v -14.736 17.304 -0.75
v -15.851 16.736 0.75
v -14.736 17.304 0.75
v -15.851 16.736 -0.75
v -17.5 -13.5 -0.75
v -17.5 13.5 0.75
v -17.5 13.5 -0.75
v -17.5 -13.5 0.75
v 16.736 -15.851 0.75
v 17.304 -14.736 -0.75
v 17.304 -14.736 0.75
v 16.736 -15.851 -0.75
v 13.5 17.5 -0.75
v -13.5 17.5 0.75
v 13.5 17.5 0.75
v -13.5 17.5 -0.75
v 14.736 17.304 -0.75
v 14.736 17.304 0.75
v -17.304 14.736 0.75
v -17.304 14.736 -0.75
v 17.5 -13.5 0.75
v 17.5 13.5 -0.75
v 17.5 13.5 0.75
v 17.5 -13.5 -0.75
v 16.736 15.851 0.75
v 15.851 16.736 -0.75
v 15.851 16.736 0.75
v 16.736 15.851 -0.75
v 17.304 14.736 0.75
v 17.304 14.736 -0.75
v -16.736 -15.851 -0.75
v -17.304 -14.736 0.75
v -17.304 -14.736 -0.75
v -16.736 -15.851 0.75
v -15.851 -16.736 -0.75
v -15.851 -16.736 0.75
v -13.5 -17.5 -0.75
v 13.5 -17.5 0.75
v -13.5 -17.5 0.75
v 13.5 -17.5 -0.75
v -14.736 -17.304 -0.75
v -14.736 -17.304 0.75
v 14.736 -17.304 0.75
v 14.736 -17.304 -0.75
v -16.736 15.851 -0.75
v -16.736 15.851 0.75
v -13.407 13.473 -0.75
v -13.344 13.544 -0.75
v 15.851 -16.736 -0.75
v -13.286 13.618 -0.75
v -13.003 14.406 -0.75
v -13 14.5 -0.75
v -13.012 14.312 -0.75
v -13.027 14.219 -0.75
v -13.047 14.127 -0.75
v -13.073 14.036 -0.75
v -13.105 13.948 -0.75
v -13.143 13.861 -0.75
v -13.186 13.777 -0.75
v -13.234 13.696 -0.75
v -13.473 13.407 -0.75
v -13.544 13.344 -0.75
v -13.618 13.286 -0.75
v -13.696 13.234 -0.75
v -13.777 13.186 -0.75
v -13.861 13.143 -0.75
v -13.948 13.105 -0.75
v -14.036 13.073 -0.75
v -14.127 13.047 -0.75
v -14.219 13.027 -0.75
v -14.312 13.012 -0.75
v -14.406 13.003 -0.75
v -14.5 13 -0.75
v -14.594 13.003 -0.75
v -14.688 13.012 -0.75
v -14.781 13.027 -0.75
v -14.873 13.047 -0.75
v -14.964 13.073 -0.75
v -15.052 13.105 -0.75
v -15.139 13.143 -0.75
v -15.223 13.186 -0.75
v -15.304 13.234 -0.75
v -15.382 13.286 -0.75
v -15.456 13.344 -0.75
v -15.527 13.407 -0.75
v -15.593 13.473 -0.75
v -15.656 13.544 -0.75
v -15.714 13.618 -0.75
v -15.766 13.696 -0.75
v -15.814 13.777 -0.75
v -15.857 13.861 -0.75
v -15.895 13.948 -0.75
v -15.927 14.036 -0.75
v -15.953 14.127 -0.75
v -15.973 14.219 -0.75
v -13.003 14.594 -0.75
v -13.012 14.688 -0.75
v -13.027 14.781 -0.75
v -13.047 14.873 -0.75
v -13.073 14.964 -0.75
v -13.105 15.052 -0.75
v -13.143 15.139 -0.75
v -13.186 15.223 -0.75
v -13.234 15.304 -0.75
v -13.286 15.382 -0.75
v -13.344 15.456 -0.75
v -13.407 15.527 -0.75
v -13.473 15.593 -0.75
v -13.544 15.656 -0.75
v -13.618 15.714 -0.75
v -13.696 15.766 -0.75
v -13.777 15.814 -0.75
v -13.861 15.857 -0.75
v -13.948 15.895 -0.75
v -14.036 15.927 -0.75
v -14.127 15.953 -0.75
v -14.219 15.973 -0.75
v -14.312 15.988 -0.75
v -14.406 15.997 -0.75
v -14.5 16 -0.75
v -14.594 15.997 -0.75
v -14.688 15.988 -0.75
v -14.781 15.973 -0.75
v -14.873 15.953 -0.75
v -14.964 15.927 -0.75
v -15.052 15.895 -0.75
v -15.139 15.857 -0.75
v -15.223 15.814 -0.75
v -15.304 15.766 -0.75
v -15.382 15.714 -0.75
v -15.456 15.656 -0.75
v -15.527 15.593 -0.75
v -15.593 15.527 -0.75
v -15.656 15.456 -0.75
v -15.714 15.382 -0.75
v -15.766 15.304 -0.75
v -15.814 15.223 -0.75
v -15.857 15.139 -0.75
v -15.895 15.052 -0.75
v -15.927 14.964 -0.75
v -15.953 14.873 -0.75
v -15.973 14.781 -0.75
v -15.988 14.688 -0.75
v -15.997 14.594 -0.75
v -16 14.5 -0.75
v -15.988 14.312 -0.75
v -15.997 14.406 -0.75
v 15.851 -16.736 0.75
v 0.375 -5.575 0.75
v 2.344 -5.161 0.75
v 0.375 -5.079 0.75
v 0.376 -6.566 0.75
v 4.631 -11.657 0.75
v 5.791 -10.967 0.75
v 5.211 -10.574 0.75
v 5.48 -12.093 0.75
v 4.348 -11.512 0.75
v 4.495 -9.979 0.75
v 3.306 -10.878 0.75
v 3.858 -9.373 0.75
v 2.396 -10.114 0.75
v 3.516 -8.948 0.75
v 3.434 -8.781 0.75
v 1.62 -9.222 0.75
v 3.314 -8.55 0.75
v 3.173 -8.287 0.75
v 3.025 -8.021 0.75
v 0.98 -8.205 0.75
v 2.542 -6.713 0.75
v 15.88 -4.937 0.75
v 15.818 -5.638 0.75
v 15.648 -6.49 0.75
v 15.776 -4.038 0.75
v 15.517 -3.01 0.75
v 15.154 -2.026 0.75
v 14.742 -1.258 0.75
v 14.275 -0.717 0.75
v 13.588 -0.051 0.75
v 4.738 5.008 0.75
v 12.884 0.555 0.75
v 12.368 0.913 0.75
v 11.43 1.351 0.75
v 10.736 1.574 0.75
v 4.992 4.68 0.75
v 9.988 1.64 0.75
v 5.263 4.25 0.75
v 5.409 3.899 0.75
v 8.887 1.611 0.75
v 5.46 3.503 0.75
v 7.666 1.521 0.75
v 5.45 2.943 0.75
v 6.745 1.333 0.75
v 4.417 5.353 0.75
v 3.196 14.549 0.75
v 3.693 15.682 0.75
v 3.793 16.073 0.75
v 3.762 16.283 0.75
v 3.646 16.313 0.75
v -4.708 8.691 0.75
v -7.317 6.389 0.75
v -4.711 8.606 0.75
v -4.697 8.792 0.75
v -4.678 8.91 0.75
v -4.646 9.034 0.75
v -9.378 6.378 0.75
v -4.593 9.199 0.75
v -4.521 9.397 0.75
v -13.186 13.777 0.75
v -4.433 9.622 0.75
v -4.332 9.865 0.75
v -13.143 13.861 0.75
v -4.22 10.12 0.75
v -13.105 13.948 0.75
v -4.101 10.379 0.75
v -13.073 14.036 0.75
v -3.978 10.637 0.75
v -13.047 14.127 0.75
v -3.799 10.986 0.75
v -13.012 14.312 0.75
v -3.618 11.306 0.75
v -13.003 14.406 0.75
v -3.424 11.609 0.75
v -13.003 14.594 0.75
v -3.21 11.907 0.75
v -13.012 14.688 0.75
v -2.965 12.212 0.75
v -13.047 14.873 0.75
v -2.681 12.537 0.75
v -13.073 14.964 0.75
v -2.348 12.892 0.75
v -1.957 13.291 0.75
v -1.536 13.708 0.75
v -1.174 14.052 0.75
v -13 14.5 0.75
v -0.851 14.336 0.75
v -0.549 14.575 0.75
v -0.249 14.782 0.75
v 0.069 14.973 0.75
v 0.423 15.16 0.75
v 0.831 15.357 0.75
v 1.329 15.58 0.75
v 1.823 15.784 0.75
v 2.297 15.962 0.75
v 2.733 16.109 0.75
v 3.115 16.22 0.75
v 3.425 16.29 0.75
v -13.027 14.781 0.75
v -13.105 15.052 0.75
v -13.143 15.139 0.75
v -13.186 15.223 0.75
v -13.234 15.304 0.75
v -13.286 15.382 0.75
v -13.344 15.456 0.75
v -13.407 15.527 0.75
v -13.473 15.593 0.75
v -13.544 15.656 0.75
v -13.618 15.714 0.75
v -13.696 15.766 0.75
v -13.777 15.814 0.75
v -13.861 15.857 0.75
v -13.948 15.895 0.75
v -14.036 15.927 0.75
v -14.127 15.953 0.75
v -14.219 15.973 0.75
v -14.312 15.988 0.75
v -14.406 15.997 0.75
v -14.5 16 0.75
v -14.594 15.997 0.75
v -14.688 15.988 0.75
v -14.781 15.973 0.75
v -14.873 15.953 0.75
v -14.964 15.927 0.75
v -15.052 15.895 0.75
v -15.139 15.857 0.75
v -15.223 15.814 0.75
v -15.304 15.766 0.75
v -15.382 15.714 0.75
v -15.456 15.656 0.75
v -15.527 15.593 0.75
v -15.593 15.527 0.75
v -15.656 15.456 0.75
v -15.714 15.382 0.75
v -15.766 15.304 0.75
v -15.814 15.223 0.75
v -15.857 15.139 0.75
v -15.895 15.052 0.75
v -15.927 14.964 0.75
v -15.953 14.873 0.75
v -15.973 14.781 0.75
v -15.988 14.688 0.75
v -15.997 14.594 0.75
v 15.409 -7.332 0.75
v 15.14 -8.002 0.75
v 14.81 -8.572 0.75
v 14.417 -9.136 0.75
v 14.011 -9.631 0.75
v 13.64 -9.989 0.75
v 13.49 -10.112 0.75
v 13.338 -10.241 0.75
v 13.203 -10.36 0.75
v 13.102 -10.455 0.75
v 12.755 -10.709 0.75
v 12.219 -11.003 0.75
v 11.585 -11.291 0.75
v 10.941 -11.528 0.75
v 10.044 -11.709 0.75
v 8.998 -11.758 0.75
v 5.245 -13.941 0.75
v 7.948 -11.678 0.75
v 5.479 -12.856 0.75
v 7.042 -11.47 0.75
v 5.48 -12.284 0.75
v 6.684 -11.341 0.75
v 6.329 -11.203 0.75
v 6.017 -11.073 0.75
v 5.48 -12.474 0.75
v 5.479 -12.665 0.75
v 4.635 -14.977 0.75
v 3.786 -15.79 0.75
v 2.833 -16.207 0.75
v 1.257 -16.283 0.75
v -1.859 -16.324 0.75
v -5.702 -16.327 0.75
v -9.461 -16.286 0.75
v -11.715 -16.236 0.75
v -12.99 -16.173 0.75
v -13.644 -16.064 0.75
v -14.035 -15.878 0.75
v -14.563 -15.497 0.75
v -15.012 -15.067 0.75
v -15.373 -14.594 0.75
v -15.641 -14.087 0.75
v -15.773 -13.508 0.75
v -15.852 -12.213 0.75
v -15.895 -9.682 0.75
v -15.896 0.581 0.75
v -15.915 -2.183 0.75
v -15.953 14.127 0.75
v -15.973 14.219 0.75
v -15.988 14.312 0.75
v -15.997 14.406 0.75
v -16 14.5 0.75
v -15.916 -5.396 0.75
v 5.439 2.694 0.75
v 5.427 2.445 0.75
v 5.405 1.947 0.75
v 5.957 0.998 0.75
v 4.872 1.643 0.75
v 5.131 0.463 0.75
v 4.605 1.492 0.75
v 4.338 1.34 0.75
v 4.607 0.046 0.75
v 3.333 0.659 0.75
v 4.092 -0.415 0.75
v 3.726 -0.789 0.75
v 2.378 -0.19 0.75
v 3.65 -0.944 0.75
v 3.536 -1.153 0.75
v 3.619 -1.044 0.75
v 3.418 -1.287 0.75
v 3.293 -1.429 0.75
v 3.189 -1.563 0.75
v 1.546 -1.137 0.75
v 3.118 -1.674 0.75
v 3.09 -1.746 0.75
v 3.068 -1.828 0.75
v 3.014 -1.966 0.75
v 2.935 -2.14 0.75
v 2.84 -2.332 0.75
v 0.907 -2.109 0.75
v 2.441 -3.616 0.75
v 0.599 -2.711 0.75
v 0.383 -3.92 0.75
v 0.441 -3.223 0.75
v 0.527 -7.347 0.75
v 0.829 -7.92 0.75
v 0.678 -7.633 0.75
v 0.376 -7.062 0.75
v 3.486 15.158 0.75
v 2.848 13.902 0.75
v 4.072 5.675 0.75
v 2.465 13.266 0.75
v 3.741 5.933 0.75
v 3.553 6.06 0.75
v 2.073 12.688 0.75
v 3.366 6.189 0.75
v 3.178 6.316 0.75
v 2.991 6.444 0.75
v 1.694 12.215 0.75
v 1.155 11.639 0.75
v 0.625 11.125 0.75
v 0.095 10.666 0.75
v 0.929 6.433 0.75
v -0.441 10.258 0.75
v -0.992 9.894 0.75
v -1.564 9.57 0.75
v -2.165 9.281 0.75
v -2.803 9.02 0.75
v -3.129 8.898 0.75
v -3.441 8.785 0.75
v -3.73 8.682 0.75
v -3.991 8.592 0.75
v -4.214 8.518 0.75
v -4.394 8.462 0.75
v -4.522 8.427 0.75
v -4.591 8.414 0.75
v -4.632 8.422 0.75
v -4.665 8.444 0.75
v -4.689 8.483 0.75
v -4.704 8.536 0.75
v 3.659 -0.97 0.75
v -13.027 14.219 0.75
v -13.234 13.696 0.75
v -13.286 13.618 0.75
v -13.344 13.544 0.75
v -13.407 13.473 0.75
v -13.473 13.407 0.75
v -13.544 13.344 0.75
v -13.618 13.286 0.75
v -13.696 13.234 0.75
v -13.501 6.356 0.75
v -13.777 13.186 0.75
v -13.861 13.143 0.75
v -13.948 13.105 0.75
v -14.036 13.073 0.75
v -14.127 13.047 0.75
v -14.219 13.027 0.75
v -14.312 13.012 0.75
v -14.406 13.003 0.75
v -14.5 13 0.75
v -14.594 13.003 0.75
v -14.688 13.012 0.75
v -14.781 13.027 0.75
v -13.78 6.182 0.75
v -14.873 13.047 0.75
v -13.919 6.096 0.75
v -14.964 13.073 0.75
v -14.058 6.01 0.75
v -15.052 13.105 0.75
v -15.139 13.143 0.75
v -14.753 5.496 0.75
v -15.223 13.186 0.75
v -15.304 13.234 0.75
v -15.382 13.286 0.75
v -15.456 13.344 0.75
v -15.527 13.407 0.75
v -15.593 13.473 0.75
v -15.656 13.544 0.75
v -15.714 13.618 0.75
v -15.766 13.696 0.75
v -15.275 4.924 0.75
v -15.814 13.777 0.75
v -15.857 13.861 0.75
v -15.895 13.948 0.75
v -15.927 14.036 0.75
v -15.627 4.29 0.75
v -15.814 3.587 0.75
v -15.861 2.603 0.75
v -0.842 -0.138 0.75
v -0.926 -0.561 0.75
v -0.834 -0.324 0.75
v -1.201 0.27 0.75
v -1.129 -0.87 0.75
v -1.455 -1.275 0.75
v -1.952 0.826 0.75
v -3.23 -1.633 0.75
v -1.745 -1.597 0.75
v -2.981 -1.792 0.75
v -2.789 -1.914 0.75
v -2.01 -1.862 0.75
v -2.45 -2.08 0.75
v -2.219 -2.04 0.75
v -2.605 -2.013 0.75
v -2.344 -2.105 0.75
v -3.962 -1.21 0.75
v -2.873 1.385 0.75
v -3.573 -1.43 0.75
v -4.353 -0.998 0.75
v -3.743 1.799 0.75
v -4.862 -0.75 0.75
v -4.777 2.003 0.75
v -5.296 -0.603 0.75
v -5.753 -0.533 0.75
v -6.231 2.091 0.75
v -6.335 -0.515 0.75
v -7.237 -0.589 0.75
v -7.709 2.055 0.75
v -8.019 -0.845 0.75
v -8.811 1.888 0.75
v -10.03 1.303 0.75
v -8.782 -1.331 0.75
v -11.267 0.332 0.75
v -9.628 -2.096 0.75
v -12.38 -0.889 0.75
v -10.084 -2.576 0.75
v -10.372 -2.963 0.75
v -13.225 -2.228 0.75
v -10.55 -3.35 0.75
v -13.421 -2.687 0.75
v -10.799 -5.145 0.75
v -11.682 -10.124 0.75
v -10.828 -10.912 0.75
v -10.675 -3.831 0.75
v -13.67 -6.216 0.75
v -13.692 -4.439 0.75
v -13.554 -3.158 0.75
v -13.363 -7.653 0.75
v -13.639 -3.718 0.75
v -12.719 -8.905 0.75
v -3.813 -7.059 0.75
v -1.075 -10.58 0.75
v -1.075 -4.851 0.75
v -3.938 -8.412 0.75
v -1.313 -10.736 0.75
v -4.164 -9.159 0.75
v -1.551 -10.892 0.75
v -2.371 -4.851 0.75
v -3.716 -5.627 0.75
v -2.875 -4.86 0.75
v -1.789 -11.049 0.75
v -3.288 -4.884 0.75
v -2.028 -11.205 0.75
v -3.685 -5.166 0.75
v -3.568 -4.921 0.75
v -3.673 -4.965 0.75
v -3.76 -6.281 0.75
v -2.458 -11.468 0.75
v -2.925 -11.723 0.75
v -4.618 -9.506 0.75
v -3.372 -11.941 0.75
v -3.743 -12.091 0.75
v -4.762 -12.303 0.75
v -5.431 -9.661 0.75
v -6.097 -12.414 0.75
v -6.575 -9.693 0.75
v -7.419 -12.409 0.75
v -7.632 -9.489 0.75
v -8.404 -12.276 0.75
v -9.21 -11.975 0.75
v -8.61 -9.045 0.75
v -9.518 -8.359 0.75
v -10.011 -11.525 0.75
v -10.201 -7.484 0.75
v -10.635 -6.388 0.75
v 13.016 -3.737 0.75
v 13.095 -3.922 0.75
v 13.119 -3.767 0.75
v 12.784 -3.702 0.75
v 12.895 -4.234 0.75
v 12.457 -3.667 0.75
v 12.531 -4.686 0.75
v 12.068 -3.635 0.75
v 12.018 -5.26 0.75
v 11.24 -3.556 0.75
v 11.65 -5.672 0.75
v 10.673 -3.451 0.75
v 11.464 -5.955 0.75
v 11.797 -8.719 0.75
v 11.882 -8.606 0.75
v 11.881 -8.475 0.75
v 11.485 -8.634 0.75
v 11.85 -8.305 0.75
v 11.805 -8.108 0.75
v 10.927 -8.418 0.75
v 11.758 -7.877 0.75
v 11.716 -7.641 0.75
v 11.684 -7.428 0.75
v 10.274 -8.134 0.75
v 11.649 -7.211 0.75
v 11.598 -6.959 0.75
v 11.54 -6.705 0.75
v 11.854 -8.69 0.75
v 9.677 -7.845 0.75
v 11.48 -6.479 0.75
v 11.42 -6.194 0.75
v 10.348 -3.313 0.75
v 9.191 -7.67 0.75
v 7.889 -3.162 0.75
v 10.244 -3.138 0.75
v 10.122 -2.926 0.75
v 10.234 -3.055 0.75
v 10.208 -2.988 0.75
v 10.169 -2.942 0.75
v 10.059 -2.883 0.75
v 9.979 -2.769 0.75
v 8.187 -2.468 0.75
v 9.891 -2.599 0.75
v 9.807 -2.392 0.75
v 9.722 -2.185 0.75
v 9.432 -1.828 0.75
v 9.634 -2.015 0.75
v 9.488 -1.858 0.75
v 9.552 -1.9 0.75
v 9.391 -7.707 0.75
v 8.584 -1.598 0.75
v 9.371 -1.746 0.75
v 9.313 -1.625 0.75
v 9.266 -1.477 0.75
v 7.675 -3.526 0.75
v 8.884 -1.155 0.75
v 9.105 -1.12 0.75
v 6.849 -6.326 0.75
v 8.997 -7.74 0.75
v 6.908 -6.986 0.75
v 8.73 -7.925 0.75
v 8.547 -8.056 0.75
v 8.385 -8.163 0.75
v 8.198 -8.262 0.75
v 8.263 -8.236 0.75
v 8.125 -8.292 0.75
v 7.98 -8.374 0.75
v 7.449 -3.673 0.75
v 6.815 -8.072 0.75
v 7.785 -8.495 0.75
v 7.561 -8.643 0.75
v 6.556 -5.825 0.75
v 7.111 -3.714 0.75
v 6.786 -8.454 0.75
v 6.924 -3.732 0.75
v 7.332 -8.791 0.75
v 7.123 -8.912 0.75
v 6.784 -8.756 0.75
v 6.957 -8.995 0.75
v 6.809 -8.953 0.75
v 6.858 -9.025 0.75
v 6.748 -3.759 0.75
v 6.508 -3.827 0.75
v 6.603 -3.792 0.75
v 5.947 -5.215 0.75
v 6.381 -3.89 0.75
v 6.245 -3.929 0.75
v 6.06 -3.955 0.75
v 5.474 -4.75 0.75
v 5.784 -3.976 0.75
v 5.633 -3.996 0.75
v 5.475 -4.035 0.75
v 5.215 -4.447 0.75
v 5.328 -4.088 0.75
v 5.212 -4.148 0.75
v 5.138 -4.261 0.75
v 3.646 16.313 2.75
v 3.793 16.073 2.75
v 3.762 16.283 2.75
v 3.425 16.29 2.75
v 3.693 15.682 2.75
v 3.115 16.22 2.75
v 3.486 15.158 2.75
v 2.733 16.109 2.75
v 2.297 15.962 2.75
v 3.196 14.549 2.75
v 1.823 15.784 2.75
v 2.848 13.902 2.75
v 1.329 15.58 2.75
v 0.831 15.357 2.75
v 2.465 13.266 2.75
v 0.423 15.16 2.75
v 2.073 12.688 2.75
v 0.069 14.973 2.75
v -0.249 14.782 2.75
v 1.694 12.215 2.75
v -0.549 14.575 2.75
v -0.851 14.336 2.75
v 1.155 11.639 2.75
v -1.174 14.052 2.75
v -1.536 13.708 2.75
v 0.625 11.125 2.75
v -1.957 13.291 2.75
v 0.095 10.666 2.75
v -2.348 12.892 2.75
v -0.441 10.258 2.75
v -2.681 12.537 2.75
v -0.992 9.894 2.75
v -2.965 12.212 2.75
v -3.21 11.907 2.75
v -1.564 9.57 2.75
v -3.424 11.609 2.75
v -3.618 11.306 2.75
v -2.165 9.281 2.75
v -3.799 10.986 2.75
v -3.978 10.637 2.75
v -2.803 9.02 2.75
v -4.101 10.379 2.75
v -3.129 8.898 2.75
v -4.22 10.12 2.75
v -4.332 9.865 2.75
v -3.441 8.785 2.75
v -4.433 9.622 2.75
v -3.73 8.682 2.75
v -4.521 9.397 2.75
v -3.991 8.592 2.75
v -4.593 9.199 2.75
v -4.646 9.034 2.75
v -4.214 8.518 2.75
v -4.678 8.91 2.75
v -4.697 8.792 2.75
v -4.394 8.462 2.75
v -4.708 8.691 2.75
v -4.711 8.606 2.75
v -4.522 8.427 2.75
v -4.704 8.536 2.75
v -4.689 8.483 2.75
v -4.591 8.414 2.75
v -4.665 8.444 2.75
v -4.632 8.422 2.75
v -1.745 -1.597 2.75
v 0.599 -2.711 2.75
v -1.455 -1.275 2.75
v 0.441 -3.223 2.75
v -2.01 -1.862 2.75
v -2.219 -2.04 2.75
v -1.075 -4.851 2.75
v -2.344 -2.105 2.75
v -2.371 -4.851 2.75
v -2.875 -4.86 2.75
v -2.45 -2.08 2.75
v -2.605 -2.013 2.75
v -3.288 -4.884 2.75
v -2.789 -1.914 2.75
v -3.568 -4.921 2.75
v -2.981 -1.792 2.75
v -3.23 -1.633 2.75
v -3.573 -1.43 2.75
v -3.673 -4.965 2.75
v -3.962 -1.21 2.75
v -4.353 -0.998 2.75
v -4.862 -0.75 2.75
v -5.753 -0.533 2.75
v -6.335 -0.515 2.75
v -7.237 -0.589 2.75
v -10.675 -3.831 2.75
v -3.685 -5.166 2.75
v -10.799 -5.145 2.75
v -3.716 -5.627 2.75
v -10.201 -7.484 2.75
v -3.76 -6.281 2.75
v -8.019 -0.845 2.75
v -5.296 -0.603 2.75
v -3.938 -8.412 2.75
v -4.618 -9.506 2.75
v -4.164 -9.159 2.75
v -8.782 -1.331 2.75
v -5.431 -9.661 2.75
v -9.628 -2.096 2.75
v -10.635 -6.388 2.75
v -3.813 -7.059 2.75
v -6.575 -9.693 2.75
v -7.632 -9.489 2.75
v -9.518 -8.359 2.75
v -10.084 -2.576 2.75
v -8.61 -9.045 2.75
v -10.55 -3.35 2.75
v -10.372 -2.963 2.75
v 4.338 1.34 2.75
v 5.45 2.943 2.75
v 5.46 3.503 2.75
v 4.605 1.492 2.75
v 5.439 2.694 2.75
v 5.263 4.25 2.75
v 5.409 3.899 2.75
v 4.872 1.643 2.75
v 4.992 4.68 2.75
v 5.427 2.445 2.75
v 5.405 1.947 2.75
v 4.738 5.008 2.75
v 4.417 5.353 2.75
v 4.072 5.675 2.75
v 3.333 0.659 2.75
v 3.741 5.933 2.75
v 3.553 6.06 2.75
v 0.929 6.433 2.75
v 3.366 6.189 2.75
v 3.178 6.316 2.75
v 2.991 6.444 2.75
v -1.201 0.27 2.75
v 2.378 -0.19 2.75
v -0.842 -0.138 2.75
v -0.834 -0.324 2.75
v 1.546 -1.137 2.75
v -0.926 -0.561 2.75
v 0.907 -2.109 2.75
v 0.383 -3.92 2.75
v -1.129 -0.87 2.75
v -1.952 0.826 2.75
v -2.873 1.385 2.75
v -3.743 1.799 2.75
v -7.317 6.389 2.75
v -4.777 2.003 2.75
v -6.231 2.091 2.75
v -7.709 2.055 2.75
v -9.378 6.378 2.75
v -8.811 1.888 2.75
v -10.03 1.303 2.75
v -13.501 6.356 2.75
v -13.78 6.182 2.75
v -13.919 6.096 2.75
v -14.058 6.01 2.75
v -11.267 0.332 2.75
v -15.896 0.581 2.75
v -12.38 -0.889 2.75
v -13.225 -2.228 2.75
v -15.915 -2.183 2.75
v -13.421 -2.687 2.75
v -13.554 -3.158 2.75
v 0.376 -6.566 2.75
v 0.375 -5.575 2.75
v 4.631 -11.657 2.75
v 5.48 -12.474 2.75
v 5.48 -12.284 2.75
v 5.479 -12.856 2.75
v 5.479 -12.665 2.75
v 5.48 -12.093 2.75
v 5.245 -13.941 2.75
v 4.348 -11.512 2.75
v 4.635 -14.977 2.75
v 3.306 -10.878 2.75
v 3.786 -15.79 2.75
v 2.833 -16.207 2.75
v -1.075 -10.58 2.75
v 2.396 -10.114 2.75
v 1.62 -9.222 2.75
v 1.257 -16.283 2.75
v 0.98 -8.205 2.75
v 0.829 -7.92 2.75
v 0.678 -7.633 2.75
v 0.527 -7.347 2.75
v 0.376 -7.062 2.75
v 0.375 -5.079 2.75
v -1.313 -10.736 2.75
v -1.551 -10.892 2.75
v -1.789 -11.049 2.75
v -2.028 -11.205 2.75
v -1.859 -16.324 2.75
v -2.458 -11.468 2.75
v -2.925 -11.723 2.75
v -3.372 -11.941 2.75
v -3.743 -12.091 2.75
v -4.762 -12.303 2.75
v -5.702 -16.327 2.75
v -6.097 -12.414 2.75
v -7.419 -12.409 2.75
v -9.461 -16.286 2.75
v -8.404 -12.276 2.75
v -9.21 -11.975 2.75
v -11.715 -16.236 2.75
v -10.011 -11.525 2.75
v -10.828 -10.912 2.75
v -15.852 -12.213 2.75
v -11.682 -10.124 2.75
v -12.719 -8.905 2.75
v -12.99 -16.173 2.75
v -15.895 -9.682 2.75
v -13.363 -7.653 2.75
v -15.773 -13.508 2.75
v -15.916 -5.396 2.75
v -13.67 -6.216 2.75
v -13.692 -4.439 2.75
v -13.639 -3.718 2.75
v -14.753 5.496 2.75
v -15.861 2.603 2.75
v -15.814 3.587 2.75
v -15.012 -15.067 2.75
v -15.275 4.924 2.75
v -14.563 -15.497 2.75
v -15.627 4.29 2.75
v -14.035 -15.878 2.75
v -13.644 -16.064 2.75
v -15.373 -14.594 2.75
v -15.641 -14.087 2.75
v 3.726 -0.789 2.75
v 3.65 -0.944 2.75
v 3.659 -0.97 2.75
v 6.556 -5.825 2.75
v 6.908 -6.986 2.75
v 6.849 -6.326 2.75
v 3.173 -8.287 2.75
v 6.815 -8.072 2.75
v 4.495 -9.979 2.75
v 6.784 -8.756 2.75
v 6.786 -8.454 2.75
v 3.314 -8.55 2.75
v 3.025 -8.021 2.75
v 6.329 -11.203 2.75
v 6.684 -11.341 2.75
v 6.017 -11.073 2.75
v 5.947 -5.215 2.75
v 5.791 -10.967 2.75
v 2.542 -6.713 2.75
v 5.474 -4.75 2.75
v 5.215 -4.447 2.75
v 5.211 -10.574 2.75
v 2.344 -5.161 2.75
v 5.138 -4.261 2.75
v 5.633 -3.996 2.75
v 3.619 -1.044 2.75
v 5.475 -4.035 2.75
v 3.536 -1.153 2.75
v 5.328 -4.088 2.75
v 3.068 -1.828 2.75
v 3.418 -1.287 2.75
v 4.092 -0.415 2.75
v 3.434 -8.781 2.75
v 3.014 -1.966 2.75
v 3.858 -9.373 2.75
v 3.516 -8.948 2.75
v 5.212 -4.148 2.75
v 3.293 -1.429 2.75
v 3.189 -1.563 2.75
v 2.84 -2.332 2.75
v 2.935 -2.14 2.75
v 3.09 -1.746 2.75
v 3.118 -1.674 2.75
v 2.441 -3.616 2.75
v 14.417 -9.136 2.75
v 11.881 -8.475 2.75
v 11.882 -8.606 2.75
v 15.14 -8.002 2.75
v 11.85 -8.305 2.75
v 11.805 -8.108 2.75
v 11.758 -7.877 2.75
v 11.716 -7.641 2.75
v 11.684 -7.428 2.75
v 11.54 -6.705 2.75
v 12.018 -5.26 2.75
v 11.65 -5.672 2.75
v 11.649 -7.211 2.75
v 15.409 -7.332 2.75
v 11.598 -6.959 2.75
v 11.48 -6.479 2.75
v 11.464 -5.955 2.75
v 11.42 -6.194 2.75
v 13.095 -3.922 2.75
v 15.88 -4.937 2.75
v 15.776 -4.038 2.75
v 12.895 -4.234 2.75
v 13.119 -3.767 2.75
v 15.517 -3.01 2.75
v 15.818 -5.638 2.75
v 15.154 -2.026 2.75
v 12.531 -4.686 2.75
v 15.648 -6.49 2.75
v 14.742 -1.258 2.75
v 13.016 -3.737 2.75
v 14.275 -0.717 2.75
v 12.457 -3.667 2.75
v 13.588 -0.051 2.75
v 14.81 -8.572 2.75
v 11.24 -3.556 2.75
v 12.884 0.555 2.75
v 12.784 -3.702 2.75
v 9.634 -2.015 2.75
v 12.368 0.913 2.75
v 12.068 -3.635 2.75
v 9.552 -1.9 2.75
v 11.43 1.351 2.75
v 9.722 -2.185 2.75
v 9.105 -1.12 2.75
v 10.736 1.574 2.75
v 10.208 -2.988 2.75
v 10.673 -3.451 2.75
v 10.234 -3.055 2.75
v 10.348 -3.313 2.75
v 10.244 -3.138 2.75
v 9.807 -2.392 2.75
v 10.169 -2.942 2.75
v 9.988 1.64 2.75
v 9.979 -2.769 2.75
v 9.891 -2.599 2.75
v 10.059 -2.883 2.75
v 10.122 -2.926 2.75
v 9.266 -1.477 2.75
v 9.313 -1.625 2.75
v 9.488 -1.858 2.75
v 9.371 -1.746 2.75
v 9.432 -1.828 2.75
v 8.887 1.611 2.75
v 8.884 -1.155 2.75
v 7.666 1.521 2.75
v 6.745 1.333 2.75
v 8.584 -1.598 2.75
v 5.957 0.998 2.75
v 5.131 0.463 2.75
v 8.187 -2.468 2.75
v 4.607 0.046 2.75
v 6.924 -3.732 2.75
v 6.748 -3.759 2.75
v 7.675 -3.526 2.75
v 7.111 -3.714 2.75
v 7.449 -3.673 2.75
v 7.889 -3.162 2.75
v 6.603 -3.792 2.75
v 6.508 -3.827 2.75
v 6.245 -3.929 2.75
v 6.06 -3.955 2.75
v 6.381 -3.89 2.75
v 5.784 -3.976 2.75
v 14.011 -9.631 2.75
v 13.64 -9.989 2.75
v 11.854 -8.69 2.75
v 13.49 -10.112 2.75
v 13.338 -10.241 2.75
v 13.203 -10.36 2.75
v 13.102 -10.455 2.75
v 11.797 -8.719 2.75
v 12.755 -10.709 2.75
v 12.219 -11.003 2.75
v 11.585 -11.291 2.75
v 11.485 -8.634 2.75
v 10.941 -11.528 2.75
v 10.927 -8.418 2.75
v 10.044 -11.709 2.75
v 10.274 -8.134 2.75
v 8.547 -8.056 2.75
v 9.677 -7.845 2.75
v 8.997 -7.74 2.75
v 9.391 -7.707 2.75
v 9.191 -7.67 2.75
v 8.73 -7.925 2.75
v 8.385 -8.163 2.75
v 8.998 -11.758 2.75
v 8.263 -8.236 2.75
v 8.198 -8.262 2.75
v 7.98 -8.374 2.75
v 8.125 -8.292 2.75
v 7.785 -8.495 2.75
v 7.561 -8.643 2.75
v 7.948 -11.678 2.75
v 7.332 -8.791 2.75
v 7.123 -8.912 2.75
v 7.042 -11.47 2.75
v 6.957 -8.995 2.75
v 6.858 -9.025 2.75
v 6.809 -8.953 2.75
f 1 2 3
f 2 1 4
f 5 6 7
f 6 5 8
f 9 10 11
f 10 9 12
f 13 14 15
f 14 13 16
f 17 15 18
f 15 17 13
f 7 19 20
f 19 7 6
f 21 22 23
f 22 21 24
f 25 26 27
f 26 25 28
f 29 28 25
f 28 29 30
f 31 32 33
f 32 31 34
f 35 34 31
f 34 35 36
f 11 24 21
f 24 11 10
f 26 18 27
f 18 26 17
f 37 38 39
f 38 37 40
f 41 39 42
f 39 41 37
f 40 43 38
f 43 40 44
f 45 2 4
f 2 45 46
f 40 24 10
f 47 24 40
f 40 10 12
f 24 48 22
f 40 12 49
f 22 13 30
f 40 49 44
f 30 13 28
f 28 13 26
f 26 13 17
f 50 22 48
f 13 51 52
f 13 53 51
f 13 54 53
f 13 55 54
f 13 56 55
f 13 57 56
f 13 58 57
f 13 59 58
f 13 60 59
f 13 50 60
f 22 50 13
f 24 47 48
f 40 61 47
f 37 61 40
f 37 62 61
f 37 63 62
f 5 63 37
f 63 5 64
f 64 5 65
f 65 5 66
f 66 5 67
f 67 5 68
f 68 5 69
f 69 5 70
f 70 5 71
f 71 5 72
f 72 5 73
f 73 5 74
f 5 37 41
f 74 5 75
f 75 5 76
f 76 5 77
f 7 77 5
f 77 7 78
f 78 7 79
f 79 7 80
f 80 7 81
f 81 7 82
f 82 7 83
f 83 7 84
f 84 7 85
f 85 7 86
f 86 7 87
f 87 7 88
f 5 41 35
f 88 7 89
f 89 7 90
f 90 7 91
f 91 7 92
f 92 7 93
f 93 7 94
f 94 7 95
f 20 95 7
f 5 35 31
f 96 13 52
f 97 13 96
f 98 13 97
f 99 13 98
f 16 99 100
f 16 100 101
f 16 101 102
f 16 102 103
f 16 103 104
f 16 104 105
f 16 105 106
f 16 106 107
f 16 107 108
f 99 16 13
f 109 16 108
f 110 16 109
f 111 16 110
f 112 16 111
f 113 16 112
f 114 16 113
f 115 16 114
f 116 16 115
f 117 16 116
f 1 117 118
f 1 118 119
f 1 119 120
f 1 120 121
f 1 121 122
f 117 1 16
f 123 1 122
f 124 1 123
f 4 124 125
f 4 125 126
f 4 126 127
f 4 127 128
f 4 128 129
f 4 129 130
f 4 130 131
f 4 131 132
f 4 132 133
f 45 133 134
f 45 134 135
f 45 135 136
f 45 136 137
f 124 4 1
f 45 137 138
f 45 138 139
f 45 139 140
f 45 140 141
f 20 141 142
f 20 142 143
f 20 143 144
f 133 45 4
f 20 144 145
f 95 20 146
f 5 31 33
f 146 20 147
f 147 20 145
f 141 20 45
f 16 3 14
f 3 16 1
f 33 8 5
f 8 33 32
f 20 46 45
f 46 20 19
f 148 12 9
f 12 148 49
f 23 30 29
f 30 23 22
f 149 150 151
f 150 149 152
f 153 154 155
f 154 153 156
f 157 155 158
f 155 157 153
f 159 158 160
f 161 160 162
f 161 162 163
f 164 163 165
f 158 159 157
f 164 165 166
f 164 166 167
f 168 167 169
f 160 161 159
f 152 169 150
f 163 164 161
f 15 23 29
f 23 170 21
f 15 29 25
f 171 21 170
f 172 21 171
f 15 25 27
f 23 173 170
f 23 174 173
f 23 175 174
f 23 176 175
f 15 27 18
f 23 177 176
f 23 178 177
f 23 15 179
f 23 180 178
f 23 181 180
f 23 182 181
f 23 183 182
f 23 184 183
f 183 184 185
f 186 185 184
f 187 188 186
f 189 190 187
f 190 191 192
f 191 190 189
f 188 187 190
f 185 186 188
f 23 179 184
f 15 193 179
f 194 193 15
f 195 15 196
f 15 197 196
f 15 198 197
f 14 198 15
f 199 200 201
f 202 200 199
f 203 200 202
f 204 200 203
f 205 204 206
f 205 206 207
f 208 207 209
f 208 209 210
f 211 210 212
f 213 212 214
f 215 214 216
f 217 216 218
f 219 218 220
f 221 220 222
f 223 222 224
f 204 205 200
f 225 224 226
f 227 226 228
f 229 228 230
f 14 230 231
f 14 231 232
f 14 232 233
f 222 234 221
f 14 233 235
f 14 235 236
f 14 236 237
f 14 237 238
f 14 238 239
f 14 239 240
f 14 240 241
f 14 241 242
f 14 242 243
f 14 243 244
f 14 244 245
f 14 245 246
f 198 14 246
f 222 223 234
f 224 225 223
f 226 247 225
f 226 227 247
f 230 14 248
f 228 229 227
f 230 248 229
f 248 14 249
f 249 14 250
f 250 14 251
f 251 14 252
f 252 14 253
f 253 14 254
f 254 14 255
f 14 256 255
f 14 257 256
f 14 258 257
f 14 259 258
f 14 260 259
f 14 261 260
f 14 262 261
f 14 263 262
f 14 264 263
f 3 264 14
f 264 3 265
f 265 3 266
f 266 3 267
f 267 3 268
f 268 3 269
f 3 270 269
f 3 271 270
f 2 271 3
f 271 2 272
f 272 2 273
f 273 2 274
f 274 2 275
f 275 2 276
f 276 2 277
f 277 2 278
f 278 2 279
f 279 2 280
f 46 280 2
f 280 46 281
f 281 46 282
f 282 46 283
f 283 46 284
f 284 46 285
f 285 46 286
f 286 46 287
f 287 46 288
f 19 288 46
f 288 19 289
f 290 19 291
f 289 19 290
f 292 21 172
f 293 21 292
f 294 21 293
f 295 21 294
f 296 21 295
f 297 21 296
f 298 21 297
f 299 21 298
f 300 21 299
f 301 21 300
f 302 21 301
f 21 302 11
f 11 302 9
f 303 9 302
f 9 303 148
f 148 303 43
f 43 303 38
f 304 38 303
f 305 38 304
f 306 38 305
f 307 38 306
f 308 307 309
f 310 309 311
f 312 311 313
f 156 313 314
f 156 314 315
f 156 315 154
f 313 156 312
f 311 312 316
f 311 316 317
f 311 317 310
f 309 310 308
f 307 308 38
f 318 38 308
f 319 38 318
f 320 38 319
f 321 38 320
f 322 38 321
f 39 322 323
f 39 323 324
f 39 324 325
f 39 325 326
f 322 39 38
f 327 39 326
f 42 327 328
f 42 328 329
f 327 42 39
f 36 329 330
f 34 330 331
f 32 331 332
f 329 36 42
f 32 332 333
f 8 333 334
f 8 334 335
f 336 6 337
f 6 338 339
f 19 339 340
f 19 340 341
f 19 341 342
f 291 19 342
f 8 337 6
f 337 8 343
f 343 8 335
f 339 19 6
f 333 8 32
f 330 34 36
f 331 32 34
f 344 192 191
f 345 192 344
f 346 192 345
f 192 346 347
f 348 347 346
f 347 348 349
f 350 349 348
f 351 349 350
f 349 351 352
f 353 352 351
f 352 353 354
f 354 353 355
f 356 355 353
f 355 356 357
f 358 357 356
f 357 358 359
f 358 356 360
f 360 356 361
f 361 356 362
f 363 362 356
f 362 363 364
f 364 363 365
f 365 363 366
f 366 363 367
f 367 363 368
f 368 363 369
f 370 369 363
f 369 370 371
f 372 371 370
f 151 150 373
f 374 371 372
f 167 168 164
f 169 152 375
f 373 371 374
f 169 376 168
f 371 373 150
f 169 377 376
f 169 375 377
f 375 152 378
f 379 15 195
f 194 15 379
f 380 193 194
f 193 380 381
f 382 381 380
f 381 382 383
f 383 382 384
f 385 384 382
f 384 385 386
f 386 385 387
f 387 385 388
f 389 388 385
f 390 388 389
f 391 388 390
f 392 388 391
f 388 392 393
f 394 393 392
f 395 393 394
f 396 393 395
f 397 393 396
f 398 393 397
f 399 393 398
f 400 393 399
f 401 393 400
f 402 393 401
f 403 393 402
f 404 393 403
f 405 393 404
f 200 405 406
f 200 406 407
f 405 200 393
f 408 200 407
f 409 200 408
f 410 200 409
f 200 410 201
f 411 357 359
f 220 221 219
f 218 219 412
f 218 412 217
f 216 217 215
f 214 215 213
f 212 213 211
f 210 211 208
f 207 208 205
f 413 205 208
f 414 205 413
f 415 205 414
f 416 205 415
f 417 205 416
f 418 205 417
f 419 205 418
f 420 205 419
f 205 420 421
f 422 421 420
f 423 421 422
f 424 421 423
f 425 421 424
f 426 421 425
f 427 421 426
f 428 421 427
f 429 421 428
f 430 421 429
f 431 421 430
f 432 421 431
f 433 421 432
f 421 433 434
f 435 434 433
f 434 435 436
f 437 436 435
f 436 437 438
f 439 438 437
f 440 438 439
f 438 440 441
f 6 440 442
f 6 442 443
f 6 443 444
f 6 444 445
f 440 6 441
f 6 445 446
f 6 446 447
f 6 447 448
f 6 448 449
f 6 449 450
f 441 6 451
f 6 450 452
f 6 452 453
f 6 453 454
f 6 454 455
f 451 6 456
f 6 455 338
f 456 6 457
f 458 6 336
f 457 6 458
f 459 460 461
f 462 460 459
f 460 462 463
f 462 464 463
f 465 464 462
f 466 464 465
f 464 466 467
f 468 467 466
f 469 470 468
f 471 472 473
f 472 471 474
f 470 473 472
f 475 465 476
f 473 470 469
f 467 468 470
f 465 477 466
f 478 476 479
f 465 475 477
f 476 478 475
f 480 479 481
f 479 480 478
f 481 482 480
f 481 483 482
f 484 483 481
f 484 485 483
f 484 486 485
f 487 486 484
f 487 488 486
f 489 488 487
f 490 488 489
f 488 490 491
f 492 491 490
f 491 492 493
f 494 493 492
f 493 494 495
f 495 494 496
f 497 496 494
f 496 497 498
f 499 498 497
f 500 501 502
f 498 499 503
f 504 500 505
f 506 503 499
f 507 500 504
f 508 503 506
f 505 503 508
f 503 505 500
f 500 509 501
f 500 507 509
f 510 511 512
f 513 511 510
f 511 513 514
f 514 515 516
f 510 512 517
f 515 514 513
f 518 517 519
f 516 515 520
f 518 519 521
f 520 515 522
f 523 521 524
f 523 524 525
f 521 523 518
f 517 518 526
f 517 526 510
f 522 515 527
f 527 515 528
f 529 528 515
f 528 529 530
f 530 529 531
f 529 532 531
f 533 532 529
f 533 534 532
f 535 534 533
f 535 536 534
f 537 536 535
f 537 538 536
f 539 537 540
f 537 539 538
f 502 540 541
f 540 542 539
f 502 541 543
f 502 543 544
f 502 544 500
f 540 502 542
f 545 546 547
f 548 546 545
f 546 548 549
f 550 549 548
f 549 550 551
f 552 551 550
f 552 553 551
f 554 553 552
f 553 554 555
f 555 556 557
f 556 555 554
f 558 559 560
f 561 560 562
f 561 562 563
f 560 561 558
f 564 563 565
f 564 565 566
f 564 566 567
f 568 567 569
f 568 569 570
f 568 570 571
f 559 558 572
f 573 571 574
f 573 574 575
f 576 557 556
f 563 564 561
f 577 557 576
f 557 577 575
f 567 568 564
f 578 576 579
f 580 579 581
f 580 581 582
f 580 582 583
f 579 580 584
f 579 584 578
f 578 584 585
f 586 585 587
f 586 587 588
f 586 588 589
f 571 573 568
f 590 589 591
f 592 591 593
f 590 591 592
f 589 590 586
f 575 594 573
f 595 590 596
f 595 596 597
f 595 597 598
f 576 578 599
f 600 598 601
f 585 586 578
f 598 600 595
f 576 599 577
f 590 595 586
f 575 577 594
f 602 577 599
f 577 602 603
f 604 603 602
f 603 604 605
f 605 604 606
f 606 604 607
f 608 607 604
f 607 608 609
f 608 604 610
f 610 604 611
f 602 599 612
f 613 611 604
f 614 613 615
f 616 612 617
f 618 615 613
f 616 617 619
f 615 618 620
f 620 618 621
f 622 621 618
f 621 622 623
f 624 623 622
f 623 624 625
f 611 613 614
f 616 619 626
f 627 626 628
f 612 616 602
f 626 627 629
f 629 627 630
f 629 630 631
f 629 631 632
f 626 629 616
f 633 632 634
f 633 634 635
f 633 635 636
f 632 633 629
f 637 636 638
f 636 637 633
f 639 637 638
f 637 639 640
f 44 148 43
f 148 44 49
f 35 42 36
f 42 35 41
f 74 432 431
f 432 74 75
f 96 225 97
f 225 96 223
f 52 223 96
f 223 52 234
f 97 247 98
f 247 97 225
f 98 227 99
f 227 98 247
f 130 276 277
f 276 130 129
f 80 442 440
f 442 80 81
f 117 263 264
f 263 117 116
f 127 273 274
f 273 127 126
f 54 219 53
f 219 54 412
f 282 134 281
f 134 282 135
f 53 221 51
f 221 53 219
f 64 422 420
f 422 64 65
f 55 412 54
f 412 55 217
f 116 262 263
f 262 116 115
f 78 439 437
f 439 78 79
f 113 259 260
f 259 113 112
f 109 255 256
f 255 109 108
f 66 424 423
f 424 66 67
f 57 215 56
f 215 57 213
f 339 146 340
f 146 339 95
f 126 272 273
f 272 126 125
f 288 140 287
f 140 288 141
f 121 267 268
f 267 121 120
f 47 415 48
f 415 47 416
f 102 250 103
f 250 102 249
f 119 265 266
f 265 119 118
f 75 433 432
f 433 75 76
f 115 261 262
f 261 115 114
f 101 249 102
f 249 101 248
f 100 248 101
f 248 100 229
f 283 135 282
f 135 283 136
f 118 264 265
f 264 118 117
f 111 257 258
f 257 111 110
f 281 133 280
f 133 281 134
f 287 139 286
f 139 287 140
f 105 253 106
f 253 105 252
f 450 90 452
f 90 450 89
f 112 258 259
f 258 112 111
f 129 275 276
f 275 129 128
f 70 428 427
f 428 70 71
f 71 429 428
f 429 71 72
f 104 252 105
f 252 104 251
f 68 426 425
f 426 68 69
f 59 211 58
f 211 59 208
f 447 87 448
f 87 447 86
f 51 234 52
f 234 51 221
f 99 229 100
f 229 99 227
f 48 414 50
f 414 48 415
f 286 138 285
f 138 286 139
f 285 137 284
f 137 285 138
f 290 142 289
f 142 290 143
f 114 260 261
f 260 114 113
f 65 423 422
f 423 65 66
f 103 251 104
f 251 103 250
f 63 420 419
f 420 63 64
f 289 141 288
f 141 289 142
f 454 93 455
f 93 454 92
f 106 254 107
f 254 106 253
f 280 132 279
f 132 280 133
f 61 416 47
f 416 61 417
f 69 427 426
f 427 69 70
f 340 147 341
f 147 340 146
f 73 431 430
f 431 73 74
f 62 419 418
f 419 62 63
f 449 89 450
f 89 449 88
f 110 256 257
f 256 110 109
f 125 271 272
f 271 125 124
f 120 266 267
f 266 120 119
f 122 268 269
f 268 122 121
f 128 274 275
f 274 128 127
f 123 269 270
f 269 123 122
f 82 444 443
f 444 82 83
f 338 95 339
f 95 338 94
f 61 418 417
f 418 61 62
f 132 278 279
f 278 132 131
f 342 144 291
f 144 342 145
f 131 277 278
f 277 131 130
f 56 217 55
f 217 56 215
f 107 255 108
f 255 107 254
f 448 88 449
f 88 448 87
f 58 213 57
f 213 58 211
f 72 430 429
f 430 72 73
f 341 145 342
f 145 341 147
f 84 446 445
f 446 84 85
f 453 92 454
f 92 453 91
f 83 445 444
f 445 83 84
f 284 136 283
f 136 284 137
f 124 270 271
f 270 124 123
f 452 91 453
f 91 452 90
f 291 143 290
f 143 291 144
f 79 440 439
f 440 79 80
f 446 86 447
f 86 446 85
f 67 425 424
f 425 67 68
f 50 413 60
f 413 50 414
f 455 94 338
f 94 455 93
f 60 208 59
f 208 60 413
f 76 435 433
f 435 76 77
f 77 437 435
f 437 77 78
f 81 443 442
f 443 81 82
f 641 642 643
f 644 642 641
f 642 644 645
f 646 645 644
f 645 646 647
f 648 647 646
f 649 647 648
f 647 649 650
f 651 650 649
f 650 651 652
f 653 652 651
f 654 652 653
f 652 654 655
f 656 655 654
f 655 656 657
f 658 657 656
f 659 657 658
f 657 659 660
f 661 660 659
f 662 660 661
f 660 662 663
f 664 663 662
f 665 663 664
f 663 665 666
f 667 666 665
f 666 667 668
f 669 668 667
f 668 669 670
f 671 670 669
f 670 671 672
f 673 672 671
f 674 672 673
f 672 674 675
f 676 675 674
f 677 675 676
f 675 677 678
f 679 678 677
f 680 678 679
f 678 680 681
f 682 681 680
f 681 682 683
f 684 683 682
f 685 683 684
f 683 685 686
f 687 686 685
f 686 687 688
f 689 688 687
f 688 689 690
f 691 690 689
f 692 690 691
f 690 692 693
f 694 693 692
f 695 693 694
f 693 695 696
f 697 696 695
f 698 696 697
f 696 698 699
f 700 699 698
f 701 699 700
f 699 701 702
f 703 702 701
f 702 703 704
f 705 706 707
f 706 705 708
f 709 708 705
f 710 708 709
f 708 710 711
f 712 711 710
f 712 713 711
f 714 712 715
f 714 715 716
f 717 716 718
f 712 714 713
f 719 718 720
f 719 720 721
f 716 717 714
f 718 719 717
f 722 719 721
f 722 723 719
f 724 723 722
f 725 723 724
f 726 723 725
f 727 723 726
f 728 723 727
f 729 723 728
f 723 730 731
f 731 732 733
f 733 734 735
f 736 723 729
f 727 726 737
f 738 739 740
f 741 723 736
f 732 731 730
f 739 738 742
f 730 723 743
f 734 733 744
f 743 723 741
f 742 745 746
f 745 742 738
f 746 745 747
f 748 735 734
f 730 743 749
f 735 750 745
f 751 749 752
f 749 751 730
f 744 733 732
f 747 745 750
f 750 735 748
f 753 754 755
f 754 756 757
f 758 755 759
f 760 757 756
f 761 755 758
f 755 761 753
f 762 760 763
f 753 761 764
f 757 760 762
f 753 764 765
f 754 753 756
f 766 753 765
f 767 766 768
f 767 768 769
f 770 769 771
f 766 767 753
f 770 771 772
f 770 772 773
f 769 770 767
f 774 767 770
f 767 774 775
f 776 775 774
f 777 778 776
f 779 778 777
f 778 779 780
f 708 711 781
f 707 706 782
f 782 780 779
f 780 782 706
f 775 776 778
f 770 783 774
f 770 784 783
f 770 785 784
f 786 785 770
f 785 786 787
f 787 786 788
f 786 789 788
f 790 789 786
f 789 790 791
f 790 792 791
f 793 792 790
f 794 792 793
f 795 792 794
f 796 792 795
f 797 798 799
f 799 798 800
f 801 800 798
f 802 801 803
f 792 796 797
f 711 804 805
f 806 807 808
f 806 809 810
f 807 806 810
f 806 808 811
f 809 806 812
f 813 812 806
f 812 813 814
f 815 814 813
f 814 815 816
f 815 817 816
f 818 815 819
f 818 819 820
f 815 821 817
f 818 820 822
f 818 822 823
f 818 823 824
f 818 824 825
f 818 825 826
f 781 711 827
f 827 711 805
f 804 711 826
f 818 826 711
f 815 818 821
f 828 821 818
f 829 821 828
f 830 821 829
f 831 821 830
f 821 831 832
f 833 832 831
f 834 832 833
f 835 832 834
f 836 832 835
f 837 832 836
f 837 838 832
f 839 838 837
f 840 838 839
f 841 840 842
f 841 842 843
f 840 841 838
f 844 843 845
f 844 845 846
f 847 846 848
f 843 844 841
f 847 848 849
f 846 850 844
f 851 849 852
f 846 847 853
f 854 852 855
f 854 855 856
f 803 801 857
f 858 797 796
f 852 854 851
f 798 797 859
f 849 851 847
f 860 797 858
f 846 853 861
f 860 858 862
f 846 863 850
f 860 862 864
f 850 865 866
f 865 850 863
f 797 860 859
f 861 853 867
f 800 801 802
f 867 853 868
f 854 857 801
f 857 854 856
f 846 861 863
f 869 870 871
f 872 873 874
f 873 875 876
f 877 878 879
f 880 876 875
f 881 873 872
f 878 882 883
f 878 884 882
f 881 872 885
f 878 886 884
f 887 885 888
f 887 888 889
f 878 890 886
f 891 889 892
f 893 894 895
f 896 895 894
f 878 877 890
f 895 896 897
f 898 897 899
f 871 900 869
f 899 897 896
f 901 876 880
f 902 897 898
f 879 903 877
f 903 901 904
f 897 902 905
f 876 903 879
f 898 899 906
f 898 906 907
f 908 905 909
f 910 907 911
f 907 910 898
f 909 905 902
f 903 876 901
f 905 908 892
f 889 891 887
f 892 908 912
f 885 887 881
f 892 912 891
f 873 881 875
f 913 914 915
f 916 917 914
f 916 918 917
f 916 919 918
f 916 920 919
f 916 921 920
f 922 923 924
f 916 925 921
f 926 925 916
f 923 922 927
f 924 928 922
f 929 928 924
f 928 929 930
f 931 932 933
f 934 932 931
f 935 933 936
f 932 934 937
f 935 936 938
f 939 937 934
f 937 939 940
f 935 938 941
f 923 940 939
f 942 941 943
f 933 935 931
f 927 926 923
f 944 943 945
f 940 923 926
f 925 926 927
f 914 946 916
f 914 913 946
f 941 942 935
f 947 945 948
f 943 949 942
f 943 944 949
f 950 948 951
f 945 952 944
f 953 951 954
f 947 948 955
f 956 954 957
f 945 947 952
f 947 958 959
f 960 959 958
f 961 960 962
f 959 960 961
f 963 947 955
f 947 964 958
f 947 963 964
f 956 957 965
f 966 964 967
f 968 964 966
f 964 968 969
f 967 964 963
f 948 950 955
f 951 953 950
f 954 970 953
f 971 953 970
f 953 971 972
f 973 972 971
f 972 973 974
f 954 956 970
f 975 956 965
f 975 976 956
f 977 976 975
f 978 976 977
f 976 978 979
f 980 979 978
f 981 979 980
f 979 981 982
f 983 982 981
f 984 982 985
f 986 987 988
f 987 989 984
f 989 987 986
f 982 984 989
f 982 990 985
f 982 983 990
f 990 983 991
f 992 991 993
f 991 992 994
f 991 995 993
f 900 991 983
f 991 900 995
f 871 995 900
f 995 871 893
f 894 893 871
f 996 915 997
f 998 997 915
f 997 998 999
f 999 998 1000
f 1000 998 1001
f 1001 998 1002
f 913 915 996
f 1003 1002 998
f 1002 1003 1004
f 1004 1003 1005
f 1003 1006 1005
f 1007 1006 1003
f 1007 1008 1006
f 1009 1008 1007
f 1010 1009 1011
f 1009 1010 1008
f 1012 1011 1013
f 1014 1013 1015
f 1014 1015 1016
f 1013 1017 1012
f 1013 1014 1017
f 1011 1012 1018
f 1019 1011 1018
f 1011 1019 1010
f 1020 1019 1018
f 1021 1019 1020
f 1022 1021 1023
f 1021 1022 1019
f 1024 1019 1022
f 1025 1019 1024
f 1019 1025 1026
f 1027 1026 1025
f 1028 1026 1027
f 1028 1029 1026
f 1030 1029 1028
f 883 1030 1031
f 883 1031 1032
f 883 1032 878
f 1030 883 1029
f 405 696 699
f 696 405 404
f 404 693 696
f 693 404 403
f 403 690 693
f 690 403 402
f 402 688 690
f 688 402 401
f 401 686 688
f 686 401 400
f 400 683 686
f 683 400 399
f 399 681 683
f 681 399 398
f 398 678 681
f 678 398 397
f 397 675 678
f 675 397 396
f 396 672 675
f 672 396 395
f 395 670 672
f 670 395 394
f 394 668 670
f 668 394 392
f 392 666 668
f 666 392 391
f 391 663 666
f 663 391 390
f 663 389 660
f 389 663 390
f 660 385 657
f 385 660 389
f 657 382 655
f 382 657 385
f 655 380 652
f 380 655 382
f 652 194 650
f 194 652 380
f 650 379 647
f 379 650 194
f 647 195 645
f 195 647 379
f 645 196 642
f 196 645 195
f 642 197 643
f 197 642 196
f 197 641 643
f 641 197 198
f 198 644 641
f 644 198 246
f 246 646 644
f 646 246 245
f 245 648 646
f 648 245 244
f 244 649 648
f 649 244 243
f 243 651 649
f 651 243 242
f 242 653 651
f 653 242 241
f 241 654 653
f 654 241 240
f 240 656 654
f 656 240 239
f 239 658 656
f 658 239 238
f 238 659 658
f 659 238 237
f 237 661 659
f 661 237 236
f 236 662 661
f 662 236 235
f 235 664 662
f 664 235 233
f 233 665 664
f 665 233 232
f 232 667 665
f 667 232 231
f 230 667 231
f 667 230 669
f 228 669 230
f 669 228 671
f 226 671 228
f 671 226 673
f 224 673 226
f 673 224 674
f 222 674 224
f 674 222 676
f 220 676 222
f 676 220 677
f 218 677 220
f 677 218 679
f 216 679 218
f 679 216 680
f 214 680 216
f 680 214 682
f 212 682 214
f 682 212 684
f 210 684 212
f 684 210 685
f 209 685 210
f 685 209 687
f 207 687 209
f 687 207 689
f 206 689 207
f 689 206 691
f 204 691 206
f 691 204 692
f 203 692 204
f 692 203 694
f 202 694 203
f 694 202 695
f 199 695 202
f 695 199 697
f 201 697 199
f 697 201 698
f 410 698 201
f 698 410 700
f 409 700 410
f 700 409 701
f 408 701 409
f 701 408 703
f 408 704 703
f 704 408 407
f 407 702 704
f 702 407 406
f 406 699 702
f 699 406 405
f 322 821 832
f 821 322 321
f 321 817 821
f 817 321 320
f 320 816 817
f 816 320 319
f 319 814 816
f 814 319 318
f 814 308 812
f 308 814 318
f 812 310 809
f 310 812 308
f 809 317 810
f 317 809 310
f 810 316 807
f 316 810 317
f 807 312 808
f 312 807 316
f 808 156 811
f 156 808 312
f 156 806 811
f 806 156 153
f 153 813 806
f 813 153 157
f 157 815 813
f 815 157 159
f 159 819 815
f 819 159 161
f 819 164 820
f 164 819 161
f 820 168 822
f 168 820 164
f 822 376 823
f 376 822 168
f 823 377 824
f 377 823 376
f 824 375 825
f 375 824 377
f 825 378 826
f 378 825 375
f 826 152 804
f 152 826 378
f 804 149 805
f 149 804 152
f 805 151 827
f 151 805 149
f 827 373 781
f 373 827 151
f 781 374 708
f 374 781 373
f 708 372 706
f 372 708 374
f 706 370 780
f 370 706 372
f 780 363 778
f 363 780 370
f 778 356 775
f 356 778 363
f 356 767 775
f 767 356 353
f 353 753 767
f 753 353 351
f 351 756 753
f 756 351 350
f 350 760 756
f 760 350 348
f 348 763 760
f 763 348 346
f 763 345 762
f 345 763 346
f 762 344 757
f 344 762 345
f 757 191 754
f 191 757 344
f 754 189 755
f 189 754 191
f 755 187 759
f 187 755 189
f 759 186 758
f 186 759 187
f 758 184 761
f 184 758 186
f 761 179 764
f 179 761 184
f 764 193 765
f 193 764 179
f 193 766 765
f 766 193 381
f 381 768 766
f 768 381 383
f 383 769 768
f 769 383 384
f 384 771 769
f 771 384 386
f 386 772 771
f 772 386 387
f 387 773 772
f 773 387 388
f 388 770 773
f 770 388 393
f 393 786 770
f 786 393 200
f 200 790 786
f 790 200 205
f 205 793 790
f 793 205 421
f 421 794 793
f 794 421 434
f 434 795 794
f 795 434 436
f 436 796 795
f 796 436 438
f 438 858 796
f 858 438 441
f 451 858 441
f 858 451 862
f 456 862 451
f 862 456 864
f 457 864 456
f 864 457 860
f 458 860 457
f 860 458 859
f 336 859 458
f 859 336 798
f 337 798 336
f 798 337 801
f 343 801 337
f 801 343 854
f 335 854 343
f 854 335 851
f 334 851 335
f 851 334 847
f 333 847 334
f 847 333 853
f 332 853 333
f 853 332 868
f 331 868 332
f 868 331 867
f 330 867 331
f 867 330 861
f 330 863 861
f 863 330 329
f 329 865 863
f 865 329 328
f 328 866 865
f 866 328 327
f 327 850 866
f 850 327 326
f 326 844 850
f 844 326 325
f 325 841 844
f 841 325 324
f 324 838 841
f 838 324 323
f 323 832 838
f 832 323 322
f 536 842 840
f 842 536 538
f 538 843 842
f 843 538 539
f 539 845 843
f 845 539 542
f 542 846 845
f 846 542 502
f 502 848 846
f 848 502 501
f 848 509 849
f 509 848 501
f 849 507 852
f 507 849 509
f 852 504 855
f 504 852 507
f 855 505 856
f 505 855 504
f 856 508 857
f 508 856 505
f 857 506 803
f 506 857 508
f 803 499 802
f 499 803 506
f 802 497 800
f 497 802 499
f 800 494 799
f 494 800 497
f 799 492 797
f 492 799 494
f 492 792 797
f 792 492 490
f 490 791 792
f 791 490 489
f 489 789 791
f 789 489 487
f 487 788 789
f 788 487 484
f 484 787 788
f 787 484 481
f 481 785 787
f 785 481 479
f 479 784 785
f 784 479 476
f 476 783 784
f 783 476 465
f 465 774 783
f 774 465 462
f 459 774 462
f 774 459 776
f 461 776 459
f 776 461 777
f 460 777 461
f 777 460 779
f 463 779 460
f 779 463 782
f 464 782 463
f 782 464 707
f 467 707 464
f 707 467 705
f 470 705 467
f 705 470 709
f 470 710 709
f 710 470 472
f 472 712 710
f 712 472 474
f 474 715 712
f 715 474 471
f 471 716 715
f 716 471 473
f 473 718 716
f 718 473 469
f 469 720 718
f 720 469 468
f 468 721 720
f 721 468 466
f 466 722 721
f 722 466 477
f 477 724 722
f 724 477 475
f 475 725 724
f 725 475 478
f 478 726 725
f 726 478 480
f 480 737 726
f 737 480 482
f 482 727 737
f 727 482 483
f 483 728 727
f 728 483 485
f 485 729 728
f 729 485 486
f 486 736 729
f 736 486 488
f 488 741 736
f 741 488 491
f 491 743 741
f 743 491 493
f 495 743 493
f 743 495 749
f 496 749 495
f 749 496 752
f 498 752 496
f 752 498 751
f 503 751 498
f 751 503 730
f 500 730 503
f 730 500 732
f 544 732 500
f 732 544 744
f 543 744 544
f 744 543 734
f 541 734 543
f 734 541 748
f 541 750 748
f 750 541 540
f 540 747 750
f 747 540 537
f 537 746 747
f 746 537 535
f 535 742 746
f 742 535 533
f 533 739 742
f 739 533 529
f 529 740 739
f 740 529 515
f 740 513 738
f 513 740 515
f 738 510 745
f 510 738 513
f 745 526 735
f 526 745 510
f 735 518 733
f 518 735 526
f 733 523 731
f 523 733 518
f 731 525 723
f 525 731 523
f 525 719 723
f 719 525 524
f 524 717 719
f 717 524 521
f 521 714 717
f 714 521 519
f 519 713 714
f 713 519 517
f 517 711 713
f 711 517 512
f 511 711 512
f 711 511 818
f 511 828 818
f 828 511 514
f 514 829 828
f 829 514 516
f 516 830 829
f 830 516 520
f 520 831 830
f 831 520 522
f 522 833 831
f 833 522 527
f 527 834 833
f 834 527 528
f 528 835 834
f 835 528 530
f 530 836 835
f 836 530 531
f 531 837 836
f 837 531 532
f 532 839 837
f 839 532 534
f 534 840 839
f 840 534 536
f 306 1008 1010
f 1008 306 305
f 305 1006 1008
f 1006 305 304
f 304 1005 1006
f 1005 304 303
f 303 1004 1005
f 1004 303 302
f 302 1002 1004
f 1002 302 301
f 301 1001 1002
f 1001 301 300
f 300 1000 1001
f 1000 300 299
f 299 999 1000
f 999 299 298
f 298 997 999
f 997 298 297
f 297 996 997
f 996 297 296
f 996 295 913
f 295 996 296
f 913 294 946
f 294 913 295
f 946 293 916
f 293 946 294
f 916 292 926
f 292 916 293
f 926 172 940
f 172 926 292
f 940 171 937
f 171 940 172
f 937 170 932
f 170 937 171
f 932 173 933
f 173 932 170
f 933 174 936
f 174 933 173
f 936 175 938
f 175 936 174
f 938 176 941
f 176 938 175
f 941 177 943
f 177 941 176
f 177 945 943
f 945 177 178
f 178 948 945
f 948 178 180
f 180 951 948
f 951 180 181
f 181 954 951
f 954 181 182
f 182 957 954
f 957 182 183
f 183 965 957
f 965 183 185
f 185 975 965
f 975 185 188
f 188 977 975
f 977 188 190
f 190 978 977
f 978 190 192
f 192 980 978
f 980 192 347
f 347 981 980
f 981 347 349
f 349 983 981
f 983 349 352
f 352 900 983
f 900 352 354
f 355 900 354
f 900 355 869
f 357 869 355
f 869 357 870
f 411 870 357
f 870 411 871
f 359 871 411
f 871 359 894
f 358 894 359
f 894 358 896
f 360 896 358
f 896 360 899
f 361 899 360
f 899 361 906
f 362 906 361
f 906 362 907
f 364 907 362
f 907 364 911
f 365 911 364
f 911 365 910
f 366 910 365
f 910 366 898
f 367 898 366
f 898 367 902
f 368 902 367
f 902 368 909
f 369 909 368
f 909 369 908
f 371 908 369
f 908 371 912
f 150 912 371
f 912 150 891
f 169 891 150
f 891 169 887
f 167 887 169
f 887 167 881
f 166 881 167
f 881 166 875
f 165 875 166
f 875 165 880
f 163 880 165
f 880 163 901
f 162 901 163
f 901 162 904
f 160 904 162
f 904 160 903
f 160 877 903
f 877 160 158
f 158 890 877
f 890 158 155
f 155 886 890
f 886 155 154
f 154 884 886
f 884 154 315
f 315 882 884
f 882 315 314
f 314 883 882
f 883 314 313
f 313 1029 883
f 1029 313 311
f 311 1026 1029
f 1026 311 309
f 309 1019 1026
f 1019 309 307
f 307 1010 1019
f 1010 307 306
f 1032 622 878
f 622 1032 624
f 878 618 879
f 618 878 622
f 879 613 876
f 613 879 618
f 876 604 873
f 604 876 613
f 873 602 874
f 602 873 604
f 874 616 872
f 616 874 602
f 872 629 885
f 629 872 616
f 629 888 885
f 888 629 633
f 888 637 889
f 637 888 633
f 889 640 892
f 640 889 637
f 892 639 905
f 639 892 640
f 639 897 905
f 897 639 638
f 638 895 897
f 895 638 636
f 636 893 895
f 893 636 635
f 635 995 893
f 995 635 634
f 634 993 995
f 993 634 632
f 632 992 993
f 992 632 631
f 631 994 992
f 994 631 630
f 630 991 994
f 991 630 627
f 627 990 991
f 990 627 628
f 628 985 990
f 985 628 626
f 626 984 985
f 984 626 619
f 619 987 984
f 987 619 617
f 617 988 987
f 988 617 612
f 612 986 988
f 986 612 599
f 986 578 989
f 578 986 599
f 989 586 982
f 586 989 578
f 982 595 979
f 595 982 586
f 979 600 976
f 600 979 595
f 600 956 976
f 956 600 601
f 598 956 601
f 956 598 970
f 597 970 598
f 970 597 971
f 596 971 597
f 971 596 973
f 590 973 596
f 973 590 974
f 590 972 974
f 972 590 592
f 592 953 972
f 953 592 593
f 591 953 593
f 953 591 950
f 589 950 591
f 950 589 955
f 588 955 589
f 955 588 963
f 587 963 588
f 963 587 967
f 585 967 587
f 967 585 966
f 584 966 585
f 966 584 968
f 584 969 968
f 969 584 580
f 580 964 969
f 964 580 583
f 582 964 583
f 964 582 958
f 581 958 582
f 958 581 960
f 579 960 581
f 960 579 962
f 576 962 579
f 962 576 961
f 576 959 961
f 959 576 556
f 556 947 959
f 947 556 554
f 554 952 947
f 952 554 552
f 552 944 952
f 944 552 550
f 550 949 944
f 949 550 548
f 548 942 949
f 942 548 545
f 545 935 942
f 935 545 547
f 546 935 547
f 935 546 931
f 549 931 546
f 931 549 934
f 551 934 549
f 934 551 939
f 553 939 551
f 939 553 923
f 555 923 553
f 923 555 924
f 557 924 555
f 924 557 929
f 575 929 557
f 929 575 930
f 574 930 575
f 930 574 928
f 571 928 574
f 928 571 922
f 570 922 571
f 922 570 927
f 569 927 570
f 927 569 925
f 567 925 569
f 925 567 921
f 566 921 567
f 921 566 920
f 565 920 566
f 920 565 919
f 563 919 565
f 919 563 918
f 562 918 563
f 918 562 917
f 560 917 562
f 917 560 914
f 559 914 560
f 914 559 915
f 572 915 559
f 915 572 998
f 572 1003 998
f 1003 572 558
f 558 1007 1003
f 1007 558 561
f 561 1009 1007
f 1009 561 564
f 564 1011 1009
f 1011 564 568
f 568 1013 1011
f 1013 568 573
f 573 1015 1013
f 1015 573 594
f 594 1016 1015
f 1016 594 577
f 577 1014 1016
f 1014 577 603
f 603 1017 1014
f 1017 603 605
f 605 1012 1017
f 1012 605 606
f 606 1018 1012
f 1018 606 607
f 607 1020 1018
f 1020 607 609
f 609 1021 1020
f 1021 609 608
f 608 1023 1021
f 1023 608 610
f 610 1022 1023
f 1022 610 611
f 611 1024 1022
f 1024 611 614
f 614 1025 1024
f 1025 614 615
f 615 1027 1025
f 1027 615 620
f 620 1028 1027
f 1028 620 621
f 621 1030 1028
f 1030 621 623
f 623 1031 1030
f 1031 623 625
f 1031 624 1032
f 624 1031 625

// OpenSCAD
//Gumcam(15,3);


module Gumcam(radius,depth)
{
	scale([radius/28,radius/28,1])
	//rotate(a = [0,90,0])
	linear_extrude(height = depth)
	import("GUMCAMv3.dxf");
}

//-- Cilindro normal. r es el radio, h es la altura
module redondo(){
rad = 20;
difference() {

	cylinder (r = rad, h = 3, $fn = 100);
	translate([0,rad -4, -10])
	cylinder (r = 1.5, h = 20, $fn = 100);
}
}
module cuad_red(lx,ly,r,h){
//-- Parametros de la caja
/*lx = 40; //-- Longitud en eje x
ly = 40; //-- Longitud en eje y
r = 5; //-- Radio del redondeo de las esquinas
h = 3; //-- Altura*/
h=h/2;
//-- Coordenadas del cilindro del primer cuadrante
cx = lx/2 - r;
cy = ly/2 - r;

//-- Posicion de los 4 cilindros de las esquinas
P1 = [cx, cy, 0];
P2 = [-cx, cy, 0];
P3 = [-cx, -cy, 0];
P4 = [cx, -cy, 0];
 

//-- Obtener el menor objeto convexo que contiene
//-- los 4 cilindros
hull() {
  translate(P1)
    cylinder(r = r, h = h, center = true, $fn = 20);
   
  translate(P2)
    cylinder(r = r, h = h, center = true, $fn = 20);
   
  translate(P3)
    cylinder(r = r, h = h, center = true, $fn = 20);
   
  translate(P4)
    cylinder(r = r, h = h, center = true, $fn = 20);
}


}
module base(dim,h){
difference() {
cuad_red(dim,dim,4,h);
	translate([-dim/2+3,dim/2-3, -10])
	cylinder (r = 1.5, h = 20, $fn = 100);
}
}


module llavero(dim,h){
union(){
	color ("red")base(dim,h);
	translate([-8,-5, h/4])
	Gumcam(dim/3,h/3*2);
}

}

llavero(35,3);
